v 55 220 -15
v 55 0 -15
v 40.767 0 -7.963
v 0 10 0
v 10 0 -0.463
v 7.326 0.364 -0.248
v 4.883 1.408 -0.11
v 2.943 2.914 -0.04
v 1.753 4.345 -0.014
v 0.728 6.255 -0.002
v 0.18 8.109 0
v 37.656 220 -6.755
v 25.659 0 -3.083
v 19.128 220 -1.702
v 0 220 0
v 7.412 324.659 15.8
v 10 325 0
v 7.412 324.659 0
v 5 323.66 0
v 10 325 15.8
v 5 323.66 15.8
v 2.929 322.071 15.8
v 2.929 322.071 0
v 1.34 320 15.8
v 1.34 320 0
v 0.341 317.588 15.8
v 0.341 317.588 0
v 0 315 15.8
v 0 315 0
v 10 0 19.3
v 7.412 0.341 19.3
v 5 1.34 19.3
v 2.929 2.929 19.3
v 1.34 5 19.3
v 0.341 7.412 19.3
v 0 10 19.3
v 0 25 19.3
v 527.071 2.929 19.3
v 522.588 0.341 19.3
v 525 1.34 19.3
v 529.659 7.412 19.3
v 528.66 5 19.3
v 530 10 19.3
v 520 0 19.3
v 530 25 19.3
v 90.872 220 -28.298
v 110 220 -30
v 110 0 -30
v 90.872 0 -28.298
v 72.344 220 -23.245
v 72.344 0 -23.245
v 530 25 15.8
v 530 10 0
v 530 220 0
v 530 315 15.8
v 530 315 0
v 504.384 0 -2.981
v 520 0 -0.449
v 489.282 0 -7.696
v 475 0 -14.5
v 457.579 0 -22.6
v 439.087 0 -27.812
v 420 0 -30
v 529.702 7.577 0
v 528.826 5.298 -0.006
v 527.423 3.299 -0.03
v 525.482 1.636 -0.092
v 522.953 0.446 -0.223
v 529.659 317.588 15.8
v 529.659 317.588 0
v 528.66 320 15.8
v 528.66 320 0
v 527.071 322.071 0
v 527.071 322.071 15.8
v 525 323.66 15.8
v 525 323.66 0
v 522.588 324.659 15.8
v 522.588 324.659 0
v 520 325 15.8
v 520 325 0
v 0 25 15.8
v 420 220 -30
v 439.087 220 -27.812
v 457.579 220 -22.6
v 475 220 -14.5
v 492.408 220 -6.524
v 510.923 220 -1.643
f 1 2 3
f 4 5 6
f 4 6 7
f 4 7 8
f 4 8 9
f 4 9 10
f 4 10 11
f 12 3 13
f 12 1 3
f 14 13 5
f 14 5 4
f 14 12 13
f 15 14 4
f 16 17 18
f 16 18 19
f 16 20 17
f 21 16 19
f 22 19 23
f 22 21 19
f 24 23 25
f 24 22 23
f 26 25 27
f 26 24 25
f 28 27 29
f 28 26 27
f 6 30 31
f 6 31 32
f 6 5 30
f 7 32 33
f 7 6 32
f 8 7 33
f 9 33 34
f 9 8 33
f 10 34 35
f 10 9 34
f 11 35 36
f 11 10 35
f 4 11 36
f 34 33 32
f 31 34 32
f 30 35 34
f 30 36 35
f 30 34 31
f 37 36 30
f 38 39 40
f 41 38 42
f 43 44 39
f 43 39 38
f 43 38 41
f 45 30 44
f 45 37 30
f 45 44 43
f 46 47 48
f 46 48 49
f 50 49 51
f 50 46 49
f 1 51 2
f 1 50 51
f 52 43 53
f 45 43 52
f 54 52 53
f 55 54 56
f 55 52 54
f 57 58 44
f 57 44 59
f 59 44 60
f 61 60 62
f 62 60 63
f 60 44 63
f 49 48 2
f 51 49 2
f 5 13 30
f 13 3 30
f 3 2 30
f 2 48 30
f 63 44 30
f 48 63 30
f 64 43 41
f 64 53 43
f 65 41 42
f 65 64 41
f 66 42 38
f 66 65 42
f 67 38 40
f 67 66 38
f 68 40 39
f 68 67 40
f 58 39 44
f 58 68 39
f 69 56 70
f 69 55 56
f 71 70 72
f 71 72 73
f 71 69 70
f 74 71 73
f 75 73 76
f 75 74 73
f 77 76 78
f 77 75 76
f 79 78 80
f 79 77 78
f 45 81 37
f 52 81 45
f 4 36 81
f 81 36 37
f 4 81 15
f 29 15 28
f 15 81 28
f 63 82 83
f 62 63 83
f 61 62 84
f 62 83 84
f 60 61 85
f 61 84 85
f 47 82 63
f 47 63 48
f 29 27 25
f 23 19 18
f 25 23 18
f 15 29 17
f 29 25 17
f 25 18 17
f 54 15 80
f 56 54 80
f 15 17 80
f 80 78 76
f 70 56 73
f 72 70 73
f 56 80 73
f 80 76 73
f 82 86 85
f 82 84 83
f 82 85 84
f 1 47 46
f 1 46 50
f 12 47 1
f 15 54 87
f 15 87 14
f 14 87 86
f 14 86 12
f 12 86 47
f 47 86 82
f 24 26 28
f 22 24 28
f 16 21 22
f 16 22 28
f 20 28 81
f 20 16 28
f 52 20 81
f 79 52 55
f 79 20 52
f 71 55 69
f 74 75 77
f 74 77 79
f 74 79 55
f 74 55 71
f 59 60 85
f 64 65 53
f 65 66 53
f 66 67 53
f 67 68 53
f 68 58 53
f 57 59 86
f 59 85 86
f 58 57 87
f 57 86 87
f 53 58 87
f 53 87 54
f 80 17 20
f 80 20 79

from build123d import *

# Parameters (mm, degrees)
ESBO_O1_W                = 530
ESBO_O1_H                = 325
RESSALTO_EXTRUS_O1_DEPTH = 15.8
ESBO_O2_W                = 530
ESBO_O2_H                = 25
RESSALTO_EXTRUS_O2_DEPTH = 3.5
ESBO_O3_W                = 530
ESBO_O3_H                = 220
RESSALTO_EXTRUS_O3_DEPTH = 30
CORTE_EXTRUS_O1_DEPTH    = 221
CORTE_EXTRUS_O2_DEPTH    = 221
FILETE2_R                = 10


with BuildPart() as part:
    # Esboço1 → Ressalto-extrusão1 (new body)
    with BuildSketch(Plane.XY):
        with Locations((265, 162.5)):
            Rectangle(ESBO_O1_W, ESBO_O1_H)
    extrude(amount=RESSALTO_EXTRUS_O1_DEPTH)

    # Esboço2 → Ressalto-extrusão2 (add)
    with BuildSketch(Plane.XY.offset(15.8)):
        with Locations((265, 12.5)):
            Rectangle(ESBO_O2_W, ESBO_O2_H)
    extrude(amount=RESSALTO_EXTRUS_O2_DEPTH)

    # Esboço3 → Ressalto-extrusão3 (add)
    with BuildSketch(Plane(origin=(0, 0, 0), x_dir=(-1, 0, 0), z_dir=(0, 0, -1))):
        with Locations((-265, 110)):
            Rectangle(ESBO_O3_W, ESBO_O3_H)
    extrude(amount=RESSALTO_EXTRUS_O3_DEPTH)

    # Esboço4 → Corte-extrusão1 (cut, through all)
    with BuildSketch(Plane(origin=(0, 220, 0), x_dir=(1, 0, 0), z_dir=(0, 1, 0))):
        with BuildLine():
            Line((530, 0), (530, 30))
            Line((530, 30), (420, 30))
            ThreePointArc((420, 30), (448.437782273, 25.577393935), (475, 14.499691353))
            ThreePointArc((475, 14.499691353), (501.560410299, 3.685808879), (530, 0))
        make_face()
    extrude(amount=-CORTE_EXTRUS_O1_DEPTH, mode=Mode.SUBTRACT)

    # Esboço6 → Corte-extrusão2 (cut, through all)
    with BuildSketch(Plane(origin=(0, 220, 0), x_dir=(1, 0, 0), z_dir=(0, 1, 0))):
        with BuildLine():
            Line((0, 0), (0, 30))
            Line((0, 30), (110, 30))
            ThreePointArc((110, 30), (81.495614373, 26.182747301), (55, 15))
            ThreePointArc((55, 15), (28.504385627, 3.817252699), (0, 0))
        make_face()
    extrude(amount=-CORTE_EXTRUS_O2_DEPTH, mode=Mode.SUBTRACT)

    # Filete2
    filete2_edges = [part.edges().sort_by_distance(p)[0] for p in [
        (0, 325, 7.9),
        (530, 325, 7.9),
        (530, 0, 9.65),
        (0, 0, 9.65),
    ]]
    fillet(filete2_edges, radius=FILETE2_R)


solid = part.part
